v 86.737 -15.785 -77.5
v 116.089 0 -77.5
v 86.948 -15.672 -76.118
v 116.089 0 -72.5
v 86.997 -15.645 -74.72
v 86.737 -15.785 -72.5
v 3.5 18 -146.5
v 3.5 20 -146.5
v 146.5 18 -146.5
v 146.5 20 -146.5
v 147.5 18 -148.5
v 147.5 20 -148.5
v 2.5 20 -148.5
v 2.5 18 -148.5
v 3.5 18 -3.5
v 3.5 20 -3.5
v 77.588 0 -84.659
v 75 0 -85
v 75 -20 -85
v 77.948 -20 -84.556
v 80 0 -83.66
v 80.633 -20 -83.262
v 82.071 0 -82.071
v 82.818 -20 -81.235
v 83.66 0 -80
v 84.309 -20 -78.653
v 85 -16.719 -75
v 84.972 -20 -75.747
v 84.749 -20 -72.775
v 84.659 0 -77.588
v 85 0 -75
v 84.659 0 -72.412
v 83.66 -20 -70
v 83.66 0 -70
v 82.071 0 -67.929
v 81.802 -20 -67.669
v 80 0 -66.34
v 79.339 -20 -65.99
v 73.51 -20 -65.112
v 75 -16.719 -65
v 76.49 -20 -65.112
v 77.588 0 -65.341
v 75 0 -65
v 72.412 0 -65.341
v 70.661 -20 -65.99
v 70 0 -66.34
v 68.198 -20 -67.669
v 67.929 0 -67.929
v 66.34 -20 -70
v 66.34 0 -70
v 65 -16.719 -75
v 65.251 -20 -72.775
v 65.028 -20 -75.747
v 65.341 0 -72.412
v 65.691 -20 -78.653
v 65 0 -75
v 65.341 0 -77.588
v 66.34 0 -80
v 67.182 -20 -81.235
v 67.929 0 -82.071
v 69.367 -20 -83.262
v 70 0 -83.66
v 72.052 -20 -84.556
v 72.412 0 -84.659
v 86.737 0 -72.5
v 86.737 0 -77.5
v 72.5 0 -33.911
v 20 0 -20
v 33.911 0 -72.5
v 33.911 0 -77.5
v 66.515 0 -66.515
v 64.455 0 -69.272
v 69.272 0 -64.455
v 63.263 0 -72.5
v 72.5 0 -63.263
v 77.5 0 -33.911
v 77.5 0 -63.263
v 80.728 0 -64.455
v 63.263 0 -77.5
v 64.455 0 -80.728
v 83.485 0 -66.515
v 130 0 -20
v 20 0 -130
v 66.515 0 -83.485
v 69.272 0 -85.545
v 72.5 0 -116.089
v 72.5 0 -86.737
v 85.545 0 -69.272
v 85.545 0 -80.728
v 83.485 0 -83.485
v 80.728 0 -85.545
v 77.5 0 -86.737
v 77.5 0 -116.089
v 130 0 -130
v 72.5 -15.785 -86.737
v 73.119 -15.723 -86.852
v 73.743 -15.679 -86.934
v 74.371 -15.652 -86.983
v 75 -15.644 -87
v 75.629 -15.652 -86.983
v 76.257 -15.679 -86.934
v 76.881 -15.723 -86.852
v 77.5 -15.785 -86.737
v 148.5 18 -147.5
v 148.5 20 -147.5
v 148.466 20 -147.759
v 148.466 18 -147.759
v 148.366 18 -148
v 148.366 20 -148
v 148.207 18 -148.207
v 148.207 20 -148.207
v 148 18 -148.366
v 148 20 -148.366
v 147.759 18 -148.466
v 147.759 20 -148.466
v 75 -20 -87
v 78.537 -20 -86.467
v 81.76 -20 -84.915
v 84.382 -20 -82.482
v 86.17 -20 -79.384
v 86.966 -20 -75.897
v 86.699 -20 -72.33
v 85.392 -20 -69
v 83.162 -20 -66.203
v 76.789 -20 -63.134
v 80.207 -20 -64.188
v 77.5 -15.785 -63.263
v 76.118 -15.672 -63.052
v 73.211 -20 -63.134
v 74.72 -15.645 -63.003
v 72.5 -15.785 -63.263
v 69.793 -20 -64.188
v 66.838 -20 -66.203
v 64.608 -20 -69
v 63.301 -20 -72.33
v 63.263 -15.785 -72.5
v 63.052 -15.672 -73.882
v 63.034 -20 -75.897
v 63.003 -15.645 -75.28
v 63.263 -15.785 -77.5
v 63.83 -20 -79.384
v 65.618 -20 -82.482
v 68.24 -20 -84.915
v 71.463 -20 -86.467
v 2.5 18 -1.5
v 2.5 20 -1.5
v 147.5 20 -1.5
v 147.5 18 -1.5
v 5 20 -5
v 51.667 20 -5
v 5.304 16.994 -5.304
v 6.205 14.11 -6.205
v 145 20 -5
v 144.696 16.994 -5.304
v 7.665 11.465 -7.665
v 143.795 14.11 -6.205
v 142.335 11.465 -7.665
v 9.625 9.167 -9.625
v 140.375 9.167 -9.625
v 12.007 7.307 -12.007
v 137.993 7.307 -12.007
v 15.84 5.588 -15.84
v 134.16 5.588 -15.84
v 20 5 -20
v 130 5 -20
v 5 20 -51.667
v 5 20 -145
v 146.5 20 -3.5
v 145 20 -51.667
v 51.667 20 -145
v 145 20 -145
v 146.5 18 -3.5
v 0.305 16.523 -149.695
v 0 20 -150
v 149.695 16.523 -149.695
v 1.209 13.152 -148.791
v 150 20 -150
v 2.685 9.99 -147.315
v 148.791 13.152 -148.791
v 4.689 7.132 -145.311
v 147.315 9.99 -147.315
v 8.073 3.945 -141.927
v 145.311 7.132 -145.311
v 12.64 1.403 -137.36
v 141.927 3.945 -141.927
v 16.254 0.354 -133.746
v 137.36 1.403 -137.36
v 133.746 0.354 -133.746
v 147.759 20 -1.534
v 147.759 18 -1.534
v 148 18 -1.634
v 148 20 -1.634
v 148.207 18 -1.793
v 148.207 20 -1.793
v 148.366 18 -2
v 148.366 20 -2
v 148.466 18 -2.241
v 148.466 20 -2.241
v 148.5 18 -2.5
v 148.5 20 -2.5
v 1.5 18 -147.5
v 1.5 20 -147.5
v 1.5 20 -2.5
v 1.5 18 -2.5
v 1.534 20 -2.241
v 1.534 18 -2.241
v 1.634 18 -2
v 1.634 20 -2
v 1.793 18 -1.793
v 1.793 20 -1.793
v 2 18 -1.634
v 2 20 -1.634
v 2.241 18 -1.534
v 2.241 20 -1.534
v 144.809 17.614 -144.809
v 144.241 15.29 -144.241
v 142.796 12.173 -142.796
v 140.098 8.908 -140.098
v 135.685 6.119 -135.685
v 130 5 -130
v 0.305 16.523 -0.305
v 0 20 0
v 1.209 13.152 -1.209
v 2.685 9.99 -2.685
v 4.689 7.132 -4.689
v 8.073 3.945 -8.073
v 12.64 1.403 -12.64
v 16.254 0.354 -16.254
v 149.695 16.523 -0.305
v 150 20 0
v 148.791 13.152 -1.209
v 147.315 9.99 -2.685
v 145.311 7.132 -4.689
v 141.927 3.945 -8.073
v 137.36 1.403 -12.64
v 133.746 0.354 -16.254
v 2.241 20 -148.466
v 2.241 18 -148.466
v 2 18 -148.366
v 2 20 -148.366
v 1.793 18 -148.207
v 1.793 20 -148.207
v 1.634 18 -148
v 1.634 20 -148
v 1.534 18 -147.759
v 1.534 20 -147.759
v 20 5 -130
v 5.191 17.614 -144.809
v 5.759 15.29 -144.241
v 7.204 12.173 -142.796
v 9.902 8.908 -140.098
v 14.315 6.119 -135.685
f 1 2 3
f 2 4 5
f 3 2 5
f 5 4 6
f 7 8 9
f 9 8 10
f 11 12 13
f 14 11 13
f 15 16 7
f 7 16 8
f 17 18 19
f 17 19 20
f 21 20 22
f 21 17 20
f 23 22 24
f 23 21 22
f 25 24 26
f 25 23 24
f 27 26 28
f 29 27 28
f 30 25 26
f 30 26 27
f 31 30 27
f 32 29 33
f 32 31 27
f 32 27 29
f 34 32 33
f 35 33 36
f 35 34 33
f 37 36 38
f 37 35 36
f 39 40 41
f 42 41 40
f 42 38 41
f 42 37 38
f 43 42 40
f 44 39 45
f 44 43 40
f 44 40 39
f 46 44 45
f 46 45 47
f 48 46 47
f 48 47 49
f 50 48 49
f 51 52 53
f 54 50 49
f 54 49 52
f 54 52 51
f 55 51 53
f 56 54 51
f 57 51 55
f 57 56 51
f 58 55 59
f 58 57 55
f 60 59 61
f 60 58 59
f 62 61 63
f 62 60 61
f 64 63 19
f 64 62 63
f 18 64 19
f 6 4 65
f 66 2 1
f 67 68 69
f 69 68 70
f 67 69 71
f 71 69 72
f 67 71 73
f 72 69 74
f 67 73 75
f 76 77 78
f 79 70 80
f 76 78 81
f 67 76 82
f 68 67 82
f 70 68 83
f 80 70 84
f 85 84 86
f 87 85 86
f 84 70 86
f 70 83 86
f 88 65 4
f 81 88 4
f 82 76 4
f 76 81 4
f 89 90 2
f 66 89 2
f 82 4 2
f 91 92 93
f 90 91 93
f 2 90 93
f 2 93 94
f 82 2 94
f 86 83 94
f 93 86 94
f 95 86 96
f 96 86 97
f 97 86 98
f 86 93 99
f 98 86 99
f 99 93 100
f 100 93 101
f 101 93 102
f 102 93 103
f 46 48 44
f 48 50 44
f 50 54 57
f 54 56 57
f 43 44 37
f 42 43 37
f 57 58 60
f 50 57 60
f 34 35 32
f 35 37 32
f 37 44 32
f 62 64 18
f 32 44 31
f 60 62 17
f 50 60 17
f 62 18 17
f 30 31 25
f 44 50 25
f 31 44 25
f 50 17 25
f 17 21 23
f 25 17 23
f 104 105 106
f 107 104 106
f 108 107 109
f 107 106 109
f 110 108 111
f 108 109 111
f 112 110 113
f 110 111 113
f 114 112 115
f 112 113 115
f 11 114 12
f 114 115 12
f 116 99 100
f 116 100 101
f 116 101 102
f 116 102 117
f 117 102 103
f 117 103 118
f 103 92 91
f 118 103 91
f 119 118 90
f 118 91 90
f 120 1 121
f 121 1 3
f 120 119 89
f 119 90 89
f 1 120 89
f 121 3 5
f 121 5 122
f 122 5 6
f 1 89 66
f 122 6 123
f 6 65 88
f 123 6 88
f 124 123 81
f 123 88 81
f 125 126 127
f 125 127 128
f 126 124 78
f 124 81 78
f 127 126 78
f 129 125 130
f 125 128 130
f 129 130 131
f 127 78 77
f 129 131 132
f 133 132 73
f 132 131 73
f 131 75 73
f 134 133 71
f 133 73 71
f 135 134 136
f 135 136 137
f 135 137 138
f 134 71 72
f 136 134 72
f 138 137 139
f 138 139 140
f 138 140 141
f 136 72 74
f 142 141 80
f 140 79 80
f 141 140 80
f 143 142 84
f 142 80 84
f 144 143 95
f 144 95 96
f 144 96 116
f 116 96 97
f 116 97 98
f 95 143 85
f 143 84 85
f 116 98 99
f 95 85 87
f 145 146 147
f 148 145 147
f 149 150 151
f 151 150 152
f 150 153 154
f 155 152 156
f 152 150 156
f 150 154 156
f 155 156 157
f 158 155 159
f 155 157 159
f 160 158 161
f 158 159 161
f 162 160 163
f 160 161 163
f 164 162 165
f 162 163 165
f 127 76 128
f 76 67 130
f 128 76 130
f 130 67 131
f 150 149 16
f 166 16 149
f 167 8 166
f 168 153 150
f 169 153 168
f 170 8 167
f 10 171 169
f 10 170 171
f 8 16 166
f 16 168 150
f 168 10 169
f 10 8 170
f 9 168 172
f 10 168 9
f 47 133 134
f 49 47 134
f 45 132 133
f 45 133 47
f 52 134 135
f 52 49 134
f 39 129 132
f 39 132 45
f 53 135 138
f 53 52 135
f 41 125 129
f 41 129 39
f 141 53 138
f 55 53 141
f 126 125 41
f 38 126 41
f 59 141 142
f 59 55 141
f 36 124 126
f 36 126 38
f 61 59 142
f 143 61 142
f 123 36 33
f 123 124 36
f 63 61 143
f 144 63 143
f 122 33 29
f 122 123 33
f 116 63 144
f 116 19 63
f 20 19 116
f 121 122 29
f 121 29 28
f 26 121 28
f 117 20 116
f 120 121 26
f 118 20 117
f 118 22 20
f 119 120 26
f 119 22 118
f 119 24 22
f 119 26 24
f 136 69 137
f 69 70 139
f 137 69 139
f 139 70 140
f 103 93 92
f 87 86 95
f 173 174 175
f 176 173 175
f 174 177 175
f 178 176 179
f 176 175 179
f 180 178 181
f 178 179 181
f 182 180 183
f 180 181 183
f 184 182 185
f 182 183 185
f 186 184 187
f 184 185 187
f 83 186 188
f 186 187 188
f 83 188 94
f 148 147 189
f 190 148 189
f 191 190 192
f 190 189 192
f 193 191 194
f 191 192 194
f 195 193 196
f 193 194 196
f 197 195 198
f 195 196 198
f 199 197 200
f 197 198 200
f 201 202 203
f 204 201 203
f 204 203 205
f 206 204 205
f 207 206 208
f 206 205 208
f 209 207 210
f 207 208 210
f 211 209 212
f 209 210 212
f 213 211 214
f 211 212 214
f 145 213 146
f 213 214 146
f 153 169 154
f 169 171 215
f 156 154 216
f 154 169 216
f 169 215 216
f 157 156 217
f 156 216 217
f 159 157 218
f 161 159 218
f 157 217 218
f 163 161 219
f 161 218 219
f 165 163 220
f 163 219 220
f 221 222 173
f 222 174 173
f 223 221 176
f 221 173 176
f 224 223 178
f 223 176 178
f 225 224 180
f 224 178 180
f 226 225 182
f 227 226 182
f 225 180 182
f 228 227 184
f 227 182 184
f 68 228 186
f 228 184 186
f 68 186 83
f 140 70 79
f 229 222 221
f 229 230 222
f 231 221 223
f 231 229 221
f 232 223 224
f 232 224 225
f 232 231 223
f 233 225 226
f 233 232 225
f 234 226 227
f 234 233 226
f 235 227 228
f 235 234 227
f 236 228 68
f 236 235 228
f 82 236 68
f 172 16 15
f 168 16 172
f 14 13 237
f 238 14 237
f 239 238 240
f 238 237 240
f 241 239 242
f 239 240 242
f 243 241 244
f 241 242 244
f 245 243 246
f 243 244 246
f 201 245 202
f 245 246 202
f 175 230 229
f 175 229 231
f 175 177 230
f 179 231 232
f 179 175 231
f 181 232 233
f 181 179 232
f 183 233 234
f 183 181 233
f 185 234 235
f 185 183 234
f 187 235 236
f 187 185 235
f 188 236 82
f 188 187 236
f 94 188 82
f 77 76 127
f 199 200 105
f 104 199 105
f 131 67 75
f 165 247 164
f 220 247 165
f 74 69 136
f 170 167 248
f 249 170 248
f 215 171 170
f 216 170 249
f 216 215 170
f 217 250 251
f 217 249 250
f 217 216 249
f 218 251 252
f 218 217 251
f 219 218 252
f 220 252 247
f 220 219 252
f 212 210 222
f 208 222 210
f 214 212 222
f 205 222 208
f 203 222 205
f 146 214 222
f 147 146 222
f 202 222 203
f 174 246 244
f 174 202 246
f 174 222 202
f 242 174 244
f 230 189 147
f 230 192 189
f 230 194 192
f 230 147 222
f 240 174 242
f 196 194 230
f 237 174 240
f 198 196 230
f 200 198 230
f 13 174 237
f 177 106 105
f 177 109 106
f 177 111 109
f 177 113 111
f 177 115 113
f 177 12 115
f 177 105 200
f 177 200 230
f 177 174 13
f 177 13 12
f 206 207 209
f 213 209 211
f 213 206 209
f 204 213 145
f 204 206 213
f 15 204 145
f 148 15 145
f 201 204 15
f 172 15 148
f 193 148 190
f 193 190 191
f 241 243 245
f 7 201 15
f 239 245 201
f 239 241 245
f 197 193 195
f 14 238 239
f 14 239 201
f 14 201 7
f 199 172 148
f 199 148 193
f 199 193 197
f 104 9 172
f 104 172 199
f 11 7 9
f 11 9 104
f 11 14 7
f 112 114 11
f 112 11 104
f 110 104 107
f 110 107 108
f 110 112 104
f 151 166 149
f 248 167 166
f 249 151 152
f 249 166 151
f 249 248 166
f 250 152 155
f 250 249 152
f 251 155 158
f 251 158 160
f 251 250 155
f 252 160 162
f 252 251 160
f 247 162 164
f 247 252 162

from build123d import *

# Parameters (mm, degrees)
SKETCH1_W           = 150
SKETCH1_H           = 150
BOSS_EXTRUDE1_DEPTH = 20
FILLET8_R           = 20
SHELL1_T            = -5
SKETCH13_W          = 143
SKETCH13_H          = 143
CUT_EXTRUDE5_DEPTH  = 2
SKETCH14_R          = 12
SKETCH14_R_2        = 10
BOSS_EXTRUDE5_DEPTH = 20
RIB18_START         = -2.5
RIB18_DEPTH         = 5
CIRPATTERN1_COUNT   = 4


# Read off the part's stored shape, not the designer's step: Rib18
with BuildPart() as part:
    # Sketch1 → Boss-Extrude1 (new body)
    with BuildSketch(Plane(origin=(0, 0, 0), x_dir=(1, 0, 0), z_dir=(0, 1, 0))):
        with Locations((75, 75)):
            Rectangle(SKETCH1_W, SKETCH1_H)
    extrude(amount=BOSS_EXTRUDE1_DEPTH)

    # Fillet8
    fillet8_edges = [part.edges().sort_by_distance(p)[0] for p in [
        (75, 0, -150),
        (150, 0, -75),
        (75, 0, 0),
        (0, 0, -75),
    ]]
    fillet(fillet8_edges, radius=FILLET8_R - 0.0001)  # a hair under: the kernel refuses the full size

    # Shell1
    shell1_openings = [part.faces().sort_by_distance(p)[0] for p in [
        (75, 20, -75),
    ]]
    offset(amount=SHELL1_T, openings=shell1_openings)

    # Sketch13 → Cut-Extrude5 (cut)
    with BuildSketch(Plane(origin=(0, 20, 0), x_dir=(1, 0, 0), z_dir=(0, 1, 0))):
        with BuildLine():
            Line((1.5, 147.5), (1.5, 2.5))
            ThreePointArc((1.5, 2.5), (1.792893219, 1.792893219), (2.5, 1.5))
            Line((2.5, 1.5), (147.5, 1.5))
            ThreePointArc((147.5, 1.5), (148.207106781, 1.792893219), (148.5, 2.5))
            Line((148.5, 2.5), (148.5, 147.5))
            ThreePointArc((148.5, 147.5), (148.207106781, 148.207106781), (147.5, 148.5))
            Line((147.5, 148.5), (2.5, 148.5))
            ThreePointArc((2.5, 148.5), (1.792893219, 148.207106781), (1.5, 147.5))
        make_face()
        with Locations((75, 75)):
            Rectangle(SKETCH13_W, SKETCH13_H, mode=Mode.SUBTRACT)
    extrude(amount=-CUT_EXTRUDE5_DEPTH, mode=Mode.SUBTRACT)

    # Sketch14 → Boss-Extrude5 (add)
    with BuildSketch(Plane.XZ):
        with Locations(Location((75, -75, 0), (0, 0, 270))):
            Circle(SKETCH14_R)
        with Locations(Location((75, -75, 0), (0, 0, 270))):
            Circle(SKETCH14_R_2, mode=Mode.SUBTRACT)
    extrude(amount=BOSS_EXTRUDE5_DEPTH)

    # Rib18 outline → Rib18 (add)
    with BuildSketch(Plane.ZY.offset(-75).offset(RIB18_START)):
        Polygon((-85, 0), (-116.088549687, 0), (-86.736694594, -15.785154629), (-85, -16.719132826), align=None)
    rib18 = extrude(amount=RIB18_DEPTH)

    # CirPattern1: Rib18 ×4 about axis
    cirpattern1_axis = Axis((75, 0, -75), (0, 1, 0))
    for i in range(1, CIRPATTERN1_COUNT):
        add(rib18.rotate(cirpattern1_axis, i * 360 / CIRPATTERN1_COUNT))


solid = part.part
